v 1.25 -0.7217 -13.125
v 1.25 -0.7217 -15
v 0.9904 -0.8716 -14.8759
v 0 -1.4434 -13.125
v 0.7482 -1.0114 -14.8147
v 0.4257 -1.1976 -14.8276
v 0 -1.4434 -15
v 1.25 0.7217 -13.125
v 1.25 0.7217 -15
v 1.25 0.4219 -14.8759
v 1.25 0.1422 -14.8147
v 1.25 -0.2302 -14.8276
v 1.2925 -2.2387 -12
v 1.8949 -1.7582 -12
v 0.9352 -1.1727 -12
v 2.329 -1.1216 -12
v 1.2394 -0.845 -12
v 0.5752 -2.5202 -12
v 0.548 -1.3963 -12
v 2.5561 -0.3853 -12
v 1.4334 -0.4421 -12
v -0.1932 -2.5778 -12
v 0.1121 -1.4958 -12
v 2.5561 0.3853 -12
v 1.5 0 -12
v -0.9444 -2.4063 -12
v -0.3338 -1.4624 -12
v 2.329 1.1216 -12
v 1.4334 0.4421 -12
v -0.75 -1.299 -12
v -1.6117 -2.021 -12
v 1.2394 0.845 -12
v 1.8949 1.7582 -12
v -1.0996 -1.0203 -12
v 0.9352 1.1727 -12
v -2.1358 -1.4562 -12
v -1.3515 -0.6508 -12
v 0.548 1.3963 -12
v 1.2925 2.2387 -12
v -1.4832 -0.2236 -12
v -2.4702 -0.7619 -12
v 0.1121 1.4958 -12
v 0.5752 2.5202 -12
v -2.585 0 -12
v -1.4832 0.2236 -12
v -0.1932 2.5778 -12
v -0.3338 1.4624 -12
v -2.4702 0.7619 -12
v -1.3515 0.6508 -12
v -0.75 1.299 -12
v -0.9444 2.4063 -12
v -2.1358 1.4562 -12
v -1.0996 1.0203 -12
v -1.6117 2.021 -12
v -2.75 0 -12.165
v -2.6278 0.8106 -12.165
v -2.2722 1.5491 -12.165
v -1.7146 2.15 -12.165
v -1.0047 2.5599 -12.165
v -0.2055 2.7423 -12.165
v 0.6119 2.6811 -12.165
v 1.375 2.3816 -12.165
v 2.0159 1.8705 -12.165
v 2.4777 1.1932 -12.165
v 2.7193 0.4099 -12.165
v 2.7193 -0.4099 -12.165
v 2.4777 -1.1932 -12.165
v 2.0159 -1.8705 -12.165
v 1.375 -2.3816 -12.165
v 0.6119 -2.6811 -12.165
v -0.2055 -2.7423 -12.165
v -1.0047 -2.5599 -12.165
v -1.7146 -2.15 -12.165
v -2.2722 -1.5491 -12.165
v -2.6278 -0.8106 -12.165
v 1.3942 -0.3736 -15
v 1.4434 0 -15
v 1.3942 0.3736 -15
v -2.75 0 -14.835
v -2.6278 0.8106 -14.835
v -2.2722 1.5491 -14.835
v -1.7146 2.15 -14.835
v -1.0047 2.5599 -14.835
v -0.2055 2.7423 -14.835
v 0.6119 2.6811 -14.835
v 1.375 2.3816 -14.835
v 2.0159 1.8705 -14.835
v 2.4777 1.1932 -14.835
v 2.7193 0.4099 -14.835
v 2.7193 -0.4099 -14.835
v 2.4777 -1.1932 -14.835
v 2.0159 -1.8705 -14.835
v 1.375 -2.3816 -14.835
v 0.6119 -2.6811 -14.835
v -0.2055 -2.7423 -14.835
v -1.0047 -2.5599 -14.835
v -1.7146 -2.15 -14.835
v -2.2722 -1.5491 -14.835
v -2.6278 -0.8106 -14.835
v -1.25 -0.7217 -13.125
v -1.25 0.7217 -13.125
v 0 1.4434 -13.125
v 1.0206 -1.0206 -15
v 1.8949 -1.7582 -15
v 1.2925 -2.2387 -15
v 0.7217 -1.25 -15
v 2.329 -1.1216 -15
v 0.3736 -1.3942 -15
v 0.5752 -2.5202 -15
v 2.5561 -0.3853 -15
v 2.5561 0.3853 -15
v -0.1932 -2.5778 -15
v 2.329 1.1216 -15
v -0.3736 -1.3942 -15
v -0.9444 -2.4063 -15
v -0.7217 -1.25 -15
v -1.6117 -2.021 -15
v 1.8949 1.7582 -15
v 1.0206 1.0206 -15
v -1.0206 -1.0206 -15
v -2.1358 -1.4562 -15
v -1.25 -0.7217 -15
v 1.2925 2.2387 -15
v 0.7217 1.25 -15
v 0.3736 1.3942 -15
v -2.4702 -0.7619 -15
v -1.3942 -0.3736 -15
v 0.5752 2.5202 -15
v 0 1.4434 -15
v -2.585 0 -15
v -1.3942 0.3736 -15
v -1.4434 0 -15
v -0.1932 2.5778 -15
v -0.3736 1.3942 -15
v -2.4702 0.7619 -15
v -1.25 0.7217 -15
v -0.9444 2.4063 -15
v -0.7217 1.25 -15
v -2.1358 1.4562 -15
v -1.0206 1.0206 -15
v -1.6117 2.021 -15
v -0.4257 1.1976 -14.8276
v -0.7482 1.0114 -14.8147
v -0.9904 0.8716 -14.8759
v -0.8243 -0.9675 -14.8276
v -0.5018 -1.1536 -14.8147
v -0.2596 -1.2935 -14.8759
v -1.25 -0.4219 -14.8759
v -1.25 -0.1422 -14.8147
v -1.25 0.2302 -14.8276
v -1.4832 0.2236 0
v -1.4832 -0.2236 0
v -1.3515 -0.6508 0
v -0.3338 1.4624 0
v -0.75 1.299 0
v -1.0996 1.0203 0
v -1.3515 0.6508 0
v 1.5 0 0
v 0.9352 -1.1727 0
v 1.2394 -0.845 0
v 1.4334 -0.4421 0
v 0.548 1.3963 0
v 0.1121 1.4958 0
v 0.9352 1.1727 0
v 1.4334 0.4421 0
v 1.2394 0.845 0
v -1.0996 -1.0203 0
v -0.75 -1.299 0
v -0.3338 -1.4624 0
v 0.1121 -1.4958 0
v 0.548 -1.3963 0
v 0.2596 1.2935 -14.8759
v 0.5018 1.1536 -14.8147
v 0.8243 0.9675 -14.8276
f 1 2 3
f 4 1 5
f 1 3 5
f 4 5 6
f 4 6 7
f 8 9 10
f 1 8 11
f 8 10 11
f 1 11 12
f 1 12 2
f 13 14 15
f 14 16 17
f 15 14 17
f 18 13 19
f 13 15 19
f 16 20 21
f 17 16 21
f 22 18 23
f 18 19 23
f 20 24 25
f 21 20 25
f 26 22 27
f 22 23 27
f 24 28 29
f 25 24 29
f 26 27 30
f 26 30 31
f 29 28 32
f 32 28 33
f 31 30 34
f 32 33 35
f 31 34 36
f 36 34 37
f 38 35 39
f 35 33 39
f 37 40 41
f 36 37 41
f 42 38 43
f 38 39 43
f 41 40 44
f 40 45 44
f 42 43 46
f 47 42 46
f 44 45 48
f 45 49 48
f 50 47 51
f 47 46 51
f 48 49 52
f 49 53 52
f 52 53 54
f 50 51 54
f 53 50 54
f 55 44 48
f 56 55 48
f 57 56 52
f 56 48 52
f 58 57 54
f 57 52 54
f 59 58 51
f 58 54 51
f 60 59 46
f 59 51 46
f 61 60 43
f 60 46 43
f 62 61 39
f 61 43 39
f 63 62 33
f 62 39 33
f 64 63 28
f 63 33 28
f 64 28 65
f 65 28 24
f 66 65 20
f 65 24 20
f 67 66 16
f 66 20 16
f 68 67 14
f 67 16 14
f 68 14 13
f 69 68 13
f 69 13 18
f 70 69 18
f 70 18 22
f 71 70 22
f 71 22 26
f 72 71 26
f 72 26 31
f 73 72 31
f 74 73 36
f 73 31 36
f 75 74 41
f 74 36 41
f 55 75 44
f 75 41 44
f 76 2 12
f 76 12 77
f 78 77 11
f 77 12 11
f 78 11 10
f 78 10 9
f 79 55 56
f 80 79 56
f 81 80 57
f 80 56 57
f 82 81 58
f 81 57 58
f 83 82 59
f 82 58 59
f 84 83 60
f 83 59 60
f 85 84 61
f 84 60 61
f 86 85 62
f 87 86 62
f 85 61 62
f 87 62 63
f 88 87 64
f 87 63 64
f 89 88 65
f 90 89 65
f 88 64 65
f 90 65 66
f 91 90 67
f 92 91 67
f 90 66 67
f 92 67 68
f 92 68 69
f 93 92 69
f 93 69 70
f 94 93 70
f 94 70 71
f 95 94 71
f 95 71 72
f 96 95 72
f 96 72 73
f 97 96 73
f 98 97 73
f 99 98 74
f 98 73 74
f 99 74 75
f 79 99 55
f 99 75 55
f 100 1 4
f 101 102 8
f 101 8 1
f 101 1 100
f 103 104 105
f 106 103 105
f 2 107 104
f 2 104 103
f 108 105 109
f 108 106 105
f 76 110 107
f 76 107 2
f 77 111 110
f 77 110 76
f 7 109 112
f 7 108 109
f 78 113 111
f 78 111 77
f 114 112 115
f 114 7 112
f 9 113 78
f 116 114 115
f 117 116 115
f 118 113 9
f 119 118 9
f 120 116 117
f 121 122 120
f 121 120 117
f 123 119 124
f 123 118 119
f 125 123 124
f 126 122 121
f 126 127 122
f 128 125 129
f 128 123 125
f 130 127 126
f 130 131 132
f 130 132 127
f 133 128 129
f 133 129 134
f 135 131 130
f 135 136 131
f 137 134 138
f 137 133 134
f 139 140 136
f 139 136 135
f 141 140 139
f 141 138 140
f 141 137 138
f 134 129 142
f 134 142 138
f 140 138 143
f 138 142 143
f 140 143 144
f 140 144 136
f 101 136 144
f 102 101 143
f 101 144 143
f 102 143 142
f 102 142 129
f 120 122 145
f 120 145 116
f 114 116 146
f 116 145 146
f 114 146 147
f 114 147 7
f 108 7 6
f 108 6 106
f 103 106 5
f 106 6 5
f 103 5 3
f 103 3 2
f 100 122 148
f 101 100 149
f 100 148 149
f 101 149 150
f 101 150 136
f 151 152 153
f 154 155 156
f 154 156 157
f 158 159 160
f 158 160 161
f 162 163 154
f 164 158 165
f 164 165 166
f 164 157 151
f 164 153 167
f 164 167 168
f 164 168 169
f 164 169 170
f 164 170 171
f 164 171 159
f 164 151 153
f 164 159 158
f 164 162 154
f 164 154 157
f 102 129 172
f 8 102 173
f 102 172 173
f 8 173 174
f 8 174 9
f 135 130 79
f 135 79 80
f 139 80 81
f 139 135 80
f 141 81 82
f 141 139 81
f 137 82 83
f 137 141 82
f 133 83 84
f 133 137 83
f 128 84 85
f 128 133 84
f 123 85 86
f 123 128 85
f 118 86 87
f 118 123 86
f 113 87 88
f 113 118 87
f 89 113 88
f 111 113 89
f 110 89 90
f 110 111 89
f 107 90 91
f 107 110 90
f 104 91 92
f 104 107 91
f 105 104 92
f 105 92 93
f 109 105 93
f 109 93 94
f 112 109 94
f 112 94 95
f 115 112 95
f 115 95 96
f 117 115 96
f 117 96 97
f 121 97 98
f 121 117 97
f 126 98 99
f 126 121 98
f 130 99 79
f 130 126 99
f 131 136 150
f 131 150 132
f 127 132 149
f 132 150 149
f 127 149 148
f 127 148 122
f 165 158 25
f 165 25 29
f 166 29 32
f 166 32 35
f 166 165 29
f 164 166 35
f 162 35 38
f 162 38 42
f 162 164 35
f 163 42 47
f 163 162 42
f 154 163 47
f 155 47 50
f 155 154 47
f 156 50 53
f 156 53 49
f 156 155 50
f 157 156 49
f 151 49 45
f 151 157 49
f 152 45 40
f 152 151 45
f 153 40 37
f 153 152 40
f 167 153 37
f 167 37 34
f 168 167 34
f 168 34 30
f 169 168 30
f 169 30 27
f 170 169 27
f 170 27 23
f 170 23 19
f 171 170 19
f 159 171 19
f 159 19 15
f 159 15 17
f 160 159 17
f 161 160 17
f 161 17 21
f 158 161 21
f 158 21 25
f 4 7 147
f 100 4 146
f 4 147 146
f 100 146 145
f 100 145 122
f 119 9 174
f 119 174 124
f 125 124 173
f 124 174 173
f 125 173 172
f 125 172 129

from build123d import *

# Parameters (mm, degrees)
SKETCH1_R          = 1.5
EXTRUDE1_DEPTH     = 12
SKETCH6_R          = 2.75
EXTRUDE2_DEPTH     = 3
CUT_EXTRUDE1_DEPTH = 1.875
CHAMFER1_SIZE      = 0.165


with BuildPart() as part:
    # Sketch1 → Extrude1 (new body)
    with BuildSketch(Plane.XY):
        Circle(SKETCH1_R)
    extrude(amount=-EXTRUDE1_DEPTH)

    # Sketch6 → Extrude2 (add)
    with BuildSketch(Plane(origin=(0, 0, -12), x_dir=(-1, 0, 0), z_dir=(0, 0, -1))):
        Circle(SKETCH6_R)
    extrude(amount=EXTRUDE2_DEPTH)

    # Sketch7 → Cut-Extrude1 (cut)
    with BuildSketch(Plane(origin=(0, 0, -15), x_dir=(-1, 0, 0), z_dir=(0, 0, -1))):
        Polygon((0, 1.443375673), (-1.25, 0.721687836), (-1.25, -0.721687836), (0, -1.443375673), (1.25, -0.721687836), (1.25, 0.721687836), align=None)
    extrude(amount=-CUT_EXTRUDE1_DEPTH, mode=Mode.SUBTRACT)

    # Cut-Extrude2 cone 1 section (through the dimple's axis) → Cut-Extrude2 (revolve, cut)
    with BuildSketch(Plane(origin=(0, 0, -15), x_dir=(0, 1, 0), z_dir=(1, 0, 0))):
        Polygon((0, 0), (1.443375673, 0), (0, 1.443375673), align=None)
    revolve(axis=Axis((0, 0, -15), (0, 0, 1)), mode=Mode.SUBTRACT)

    # Chamfer1
    chamfer1_edges = [part.edges().sort_by_distance(p)[0] for p in [
        (2.75, 0, -12),
        (2.75, 0, -15),
    ]]
    chamfer(chamfer1_edges, length=CHAMFER1_SIZE)

    # Sketch10 → Revolve1 (revolve)
    with BuildSketch(Plane(origin=(0, 0, 0), x_dir=(0, 0, -1), z_dir=(1, 0, 0))):
        Polygon((12, 1.5), (12, 0), (11.253679656, 0), (11.875, 1.5), align=None)
    revolve(axis=Axis((0, 0, -12), (0, 0, 1)))


solid = part.part
